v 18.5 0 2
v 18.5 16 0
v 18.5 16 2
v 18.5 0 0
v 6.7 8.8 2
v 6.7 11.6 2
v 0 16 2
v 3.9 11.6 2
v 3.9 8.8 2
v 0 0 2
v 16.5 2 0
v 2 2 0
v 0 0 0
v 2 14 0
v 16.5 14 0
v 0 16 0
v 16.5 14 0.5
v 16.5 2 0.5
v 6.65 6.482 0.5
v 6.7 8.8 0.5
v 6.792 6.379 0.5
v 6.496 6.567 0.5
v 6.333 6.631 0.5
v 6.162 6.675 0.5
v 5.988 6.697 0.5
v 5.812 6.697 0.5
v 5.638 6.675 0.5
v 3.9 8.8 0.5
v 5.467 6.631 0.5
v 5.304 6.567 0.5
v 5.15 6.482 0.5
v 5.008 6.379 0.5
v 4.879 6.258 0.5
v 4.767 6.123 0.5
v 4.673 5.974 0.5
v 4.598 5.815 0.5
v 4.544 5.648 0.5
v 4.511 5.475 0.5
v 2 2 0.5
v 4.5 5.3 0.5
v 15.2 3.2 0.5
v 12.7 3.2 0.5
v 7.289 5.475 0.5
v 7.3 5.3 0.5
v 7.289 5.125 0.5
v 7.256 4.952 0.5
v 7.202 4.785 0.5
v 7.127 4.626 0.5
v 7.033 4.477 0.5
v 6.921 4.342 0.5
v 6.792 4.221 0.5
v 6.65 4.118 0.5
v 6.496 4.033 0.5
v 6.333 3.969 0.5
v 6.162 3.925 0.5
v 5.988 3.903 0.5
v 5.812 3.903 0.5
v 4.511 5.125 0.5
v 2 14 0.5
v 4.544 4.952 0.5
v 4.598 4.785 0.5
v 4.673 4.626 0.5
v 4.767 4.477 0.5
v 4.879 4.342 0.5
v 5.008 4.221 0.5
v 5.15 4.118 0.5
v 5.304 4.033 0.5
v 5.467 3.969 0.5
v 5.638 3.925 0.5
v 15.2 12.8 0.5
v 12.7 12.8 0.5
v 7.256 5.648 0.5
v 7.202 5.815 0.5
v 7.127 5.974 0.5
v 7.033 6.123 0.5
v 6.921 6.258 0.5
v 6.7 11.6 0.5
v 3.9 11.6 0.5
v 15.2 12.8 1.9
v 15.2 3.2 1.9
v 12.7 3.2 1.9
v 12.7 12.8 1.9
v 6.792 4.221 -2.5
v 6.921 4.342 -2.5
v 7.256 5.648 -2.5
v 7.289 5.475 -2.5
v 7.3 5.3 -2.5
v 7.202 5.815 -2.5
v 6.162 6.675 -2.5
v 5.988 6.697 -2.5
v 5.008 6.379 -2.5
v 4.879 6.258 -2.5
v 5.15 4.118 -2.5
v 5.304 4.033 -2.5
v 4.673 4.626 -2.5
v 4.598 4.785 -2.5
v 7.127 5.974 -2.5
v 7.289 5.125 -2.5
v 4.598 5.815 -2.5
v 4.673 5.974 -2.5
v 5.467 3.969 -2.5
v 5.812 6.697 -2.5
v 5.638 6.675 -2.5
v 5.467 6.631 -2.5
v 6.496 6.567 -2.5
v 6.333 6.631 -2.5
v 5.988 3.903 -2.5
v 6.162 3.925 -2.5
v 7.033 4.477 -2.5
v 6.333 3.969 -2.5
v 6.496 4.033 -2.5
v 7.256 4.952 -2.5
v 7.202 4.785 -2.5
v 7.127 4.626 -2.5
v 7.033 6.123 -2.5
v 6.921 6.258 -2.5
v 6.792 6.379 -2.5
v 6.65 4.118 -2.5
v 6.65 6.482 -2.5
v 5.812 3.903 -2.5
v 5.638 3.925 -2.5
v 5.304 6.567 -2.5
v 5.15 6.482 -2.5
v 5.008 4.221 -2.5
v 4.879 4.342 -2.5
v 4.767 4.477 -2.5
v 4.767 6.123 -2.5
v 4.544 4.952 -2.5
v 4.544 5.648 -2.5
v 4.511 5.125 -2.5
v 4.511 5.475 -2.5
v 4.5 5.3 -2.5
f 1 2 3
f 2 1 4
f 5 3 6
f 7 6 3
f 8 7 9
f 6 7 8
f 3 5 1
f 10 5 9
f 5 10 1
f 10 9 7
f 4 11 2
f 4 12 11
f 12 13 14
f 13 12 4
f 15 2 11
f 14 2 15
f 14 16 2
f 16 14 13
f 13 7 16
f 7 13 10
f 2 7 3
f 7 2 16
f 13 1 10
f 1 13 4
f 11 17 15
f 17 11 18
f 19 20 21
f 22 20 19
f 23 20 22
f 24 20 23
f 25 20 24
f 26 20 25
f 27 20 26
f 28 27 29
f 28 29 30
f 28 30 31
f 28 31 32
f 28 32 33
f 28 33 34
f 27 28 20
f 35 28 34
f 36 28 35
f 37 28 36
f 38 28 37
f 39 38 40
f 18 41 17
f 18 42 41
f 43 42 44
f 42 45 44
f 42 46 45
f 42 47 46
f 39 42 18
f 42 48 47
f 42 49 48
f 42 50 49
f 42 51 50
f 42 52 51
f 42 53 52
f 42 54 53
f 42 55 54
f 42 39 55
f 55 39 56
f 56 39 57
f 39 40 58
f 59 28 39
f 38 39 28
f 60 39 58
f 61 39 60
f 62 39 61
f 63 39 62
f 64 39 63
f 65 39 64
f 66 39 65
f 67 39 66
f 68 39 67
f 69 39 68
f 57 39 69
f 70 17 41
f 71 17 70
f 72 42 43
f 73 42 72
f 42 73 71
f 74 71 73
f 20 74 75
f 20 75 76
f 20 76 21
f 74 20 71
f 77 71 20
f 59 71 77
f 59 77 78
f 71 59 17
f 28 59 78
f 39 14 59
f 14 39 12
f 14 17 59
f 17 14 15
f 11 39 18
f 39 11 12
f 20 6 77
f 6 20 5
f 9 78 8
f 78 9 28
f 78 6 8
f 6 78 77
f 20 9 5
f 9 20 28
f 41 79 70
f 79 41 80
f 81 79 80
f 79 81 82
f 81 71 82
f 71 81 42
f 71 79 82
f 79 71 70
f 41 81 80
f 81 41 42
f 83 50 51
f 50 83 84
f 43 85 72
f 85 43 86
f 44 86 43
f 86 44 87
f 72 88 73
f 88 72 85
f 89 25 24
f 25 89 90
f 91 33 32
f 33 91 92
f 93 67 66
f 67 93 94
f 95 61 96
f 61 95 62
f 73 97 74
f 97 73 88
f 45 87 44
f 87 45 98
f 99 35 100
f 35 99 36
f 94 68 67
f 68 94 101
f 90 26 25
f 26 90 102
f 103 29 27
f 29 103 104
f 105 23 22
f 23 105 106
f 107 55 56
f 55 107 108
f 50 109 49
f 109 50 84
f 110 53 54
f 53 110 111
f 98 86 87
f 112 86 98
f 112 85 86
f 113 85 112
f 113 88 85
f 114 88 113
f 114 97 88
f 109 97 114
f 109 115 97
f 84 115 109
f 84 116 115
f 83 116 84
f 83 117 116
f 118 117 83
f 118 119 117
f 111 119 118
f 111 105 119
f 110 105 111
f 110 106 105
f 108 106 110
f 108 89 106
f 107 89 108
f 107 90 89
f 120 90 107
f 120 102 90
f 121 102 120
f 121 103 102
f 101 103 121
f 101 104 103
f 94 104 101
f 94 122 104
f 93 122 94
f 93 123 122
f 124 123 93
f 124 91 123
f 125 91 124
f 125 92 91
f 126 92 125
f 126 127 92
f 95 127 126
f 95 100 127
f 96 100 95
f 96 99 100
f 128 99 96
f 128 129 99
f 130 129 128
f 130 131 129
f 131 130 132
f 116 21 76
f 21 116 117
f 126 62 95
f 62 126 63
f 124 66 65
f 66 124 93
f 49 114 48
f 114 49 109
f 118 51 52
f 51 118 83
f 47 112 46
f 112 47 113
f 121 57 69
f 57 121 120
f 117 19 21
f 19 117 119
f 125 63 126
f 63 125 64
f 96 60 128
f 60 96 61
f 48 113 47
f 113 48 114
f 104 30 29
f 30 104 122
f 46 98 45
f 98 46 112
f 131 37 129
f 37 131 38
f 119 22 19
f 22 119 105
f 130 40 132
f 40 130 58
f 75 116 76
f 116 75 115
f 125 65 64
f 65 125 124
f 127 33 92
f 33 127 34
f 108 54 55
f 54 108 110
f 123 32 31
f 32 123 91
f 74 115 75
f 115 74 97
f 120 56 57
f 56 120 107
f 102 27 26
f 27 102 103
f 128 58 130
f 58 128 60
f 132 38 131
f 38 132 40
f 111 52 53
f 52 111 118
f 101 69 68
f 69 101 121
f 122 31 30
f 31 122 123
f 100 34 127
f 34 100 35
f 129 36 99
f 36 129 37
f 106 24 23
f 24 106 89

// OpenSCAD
$fn = 50;

padding = 2.0;

wall_thickness = 2.0;

width = 12.0;
length = 14.5;

module bme280() {
  cutout_depth = 0.5;

  module surrounding() {
    l = length + padding * 2;
    w = width + padding * 2;
    h = wall_thickness;
    cube([l, w, h]);
  }

  module recess() {
    translate([padding, padding, 0]) {
      cube([length, width, cutout_depth]); 
    }
  }
  
  module peg() {
    radius = 1.4;
    height = 3.0;
    center = padding + width / 2;
    recessGap = 2.5;
    distanceFromCenter = 2.7;
    translate([padding + radius + recessGap, center - distanceFromCenter, -height + cutout_depth]) {
      cylinder(height, radius * 1.0, radius);
    }
  }
 
  // For the sensor
  module cutout() {
    l = 2.8;
    w = 2.8;
    h = 1.7;
    center = padding + width / 2;
    recessGap = 1.9;
    distanceFromCenter = 0.8;
    translate([padding + recessGap, center + distanceFromCenter, 0]) {
      cube([l, w, wall_thickness]);
    }
  }
  
  // Space for the soldered pins
  module pins() {
    l = 2.5;
    w = 9.6;
    h = 1.9;
    recessGap = 1.3;
    translate([padding + length - l - recessGap, padding + (width - w) / 2, 0]) {
      cube([l, w, h]);
    }
  }
  
  difference() {
    surrounding();
    recess();
    cutout();
    pins();
  }
  peg();
}

bme280();
